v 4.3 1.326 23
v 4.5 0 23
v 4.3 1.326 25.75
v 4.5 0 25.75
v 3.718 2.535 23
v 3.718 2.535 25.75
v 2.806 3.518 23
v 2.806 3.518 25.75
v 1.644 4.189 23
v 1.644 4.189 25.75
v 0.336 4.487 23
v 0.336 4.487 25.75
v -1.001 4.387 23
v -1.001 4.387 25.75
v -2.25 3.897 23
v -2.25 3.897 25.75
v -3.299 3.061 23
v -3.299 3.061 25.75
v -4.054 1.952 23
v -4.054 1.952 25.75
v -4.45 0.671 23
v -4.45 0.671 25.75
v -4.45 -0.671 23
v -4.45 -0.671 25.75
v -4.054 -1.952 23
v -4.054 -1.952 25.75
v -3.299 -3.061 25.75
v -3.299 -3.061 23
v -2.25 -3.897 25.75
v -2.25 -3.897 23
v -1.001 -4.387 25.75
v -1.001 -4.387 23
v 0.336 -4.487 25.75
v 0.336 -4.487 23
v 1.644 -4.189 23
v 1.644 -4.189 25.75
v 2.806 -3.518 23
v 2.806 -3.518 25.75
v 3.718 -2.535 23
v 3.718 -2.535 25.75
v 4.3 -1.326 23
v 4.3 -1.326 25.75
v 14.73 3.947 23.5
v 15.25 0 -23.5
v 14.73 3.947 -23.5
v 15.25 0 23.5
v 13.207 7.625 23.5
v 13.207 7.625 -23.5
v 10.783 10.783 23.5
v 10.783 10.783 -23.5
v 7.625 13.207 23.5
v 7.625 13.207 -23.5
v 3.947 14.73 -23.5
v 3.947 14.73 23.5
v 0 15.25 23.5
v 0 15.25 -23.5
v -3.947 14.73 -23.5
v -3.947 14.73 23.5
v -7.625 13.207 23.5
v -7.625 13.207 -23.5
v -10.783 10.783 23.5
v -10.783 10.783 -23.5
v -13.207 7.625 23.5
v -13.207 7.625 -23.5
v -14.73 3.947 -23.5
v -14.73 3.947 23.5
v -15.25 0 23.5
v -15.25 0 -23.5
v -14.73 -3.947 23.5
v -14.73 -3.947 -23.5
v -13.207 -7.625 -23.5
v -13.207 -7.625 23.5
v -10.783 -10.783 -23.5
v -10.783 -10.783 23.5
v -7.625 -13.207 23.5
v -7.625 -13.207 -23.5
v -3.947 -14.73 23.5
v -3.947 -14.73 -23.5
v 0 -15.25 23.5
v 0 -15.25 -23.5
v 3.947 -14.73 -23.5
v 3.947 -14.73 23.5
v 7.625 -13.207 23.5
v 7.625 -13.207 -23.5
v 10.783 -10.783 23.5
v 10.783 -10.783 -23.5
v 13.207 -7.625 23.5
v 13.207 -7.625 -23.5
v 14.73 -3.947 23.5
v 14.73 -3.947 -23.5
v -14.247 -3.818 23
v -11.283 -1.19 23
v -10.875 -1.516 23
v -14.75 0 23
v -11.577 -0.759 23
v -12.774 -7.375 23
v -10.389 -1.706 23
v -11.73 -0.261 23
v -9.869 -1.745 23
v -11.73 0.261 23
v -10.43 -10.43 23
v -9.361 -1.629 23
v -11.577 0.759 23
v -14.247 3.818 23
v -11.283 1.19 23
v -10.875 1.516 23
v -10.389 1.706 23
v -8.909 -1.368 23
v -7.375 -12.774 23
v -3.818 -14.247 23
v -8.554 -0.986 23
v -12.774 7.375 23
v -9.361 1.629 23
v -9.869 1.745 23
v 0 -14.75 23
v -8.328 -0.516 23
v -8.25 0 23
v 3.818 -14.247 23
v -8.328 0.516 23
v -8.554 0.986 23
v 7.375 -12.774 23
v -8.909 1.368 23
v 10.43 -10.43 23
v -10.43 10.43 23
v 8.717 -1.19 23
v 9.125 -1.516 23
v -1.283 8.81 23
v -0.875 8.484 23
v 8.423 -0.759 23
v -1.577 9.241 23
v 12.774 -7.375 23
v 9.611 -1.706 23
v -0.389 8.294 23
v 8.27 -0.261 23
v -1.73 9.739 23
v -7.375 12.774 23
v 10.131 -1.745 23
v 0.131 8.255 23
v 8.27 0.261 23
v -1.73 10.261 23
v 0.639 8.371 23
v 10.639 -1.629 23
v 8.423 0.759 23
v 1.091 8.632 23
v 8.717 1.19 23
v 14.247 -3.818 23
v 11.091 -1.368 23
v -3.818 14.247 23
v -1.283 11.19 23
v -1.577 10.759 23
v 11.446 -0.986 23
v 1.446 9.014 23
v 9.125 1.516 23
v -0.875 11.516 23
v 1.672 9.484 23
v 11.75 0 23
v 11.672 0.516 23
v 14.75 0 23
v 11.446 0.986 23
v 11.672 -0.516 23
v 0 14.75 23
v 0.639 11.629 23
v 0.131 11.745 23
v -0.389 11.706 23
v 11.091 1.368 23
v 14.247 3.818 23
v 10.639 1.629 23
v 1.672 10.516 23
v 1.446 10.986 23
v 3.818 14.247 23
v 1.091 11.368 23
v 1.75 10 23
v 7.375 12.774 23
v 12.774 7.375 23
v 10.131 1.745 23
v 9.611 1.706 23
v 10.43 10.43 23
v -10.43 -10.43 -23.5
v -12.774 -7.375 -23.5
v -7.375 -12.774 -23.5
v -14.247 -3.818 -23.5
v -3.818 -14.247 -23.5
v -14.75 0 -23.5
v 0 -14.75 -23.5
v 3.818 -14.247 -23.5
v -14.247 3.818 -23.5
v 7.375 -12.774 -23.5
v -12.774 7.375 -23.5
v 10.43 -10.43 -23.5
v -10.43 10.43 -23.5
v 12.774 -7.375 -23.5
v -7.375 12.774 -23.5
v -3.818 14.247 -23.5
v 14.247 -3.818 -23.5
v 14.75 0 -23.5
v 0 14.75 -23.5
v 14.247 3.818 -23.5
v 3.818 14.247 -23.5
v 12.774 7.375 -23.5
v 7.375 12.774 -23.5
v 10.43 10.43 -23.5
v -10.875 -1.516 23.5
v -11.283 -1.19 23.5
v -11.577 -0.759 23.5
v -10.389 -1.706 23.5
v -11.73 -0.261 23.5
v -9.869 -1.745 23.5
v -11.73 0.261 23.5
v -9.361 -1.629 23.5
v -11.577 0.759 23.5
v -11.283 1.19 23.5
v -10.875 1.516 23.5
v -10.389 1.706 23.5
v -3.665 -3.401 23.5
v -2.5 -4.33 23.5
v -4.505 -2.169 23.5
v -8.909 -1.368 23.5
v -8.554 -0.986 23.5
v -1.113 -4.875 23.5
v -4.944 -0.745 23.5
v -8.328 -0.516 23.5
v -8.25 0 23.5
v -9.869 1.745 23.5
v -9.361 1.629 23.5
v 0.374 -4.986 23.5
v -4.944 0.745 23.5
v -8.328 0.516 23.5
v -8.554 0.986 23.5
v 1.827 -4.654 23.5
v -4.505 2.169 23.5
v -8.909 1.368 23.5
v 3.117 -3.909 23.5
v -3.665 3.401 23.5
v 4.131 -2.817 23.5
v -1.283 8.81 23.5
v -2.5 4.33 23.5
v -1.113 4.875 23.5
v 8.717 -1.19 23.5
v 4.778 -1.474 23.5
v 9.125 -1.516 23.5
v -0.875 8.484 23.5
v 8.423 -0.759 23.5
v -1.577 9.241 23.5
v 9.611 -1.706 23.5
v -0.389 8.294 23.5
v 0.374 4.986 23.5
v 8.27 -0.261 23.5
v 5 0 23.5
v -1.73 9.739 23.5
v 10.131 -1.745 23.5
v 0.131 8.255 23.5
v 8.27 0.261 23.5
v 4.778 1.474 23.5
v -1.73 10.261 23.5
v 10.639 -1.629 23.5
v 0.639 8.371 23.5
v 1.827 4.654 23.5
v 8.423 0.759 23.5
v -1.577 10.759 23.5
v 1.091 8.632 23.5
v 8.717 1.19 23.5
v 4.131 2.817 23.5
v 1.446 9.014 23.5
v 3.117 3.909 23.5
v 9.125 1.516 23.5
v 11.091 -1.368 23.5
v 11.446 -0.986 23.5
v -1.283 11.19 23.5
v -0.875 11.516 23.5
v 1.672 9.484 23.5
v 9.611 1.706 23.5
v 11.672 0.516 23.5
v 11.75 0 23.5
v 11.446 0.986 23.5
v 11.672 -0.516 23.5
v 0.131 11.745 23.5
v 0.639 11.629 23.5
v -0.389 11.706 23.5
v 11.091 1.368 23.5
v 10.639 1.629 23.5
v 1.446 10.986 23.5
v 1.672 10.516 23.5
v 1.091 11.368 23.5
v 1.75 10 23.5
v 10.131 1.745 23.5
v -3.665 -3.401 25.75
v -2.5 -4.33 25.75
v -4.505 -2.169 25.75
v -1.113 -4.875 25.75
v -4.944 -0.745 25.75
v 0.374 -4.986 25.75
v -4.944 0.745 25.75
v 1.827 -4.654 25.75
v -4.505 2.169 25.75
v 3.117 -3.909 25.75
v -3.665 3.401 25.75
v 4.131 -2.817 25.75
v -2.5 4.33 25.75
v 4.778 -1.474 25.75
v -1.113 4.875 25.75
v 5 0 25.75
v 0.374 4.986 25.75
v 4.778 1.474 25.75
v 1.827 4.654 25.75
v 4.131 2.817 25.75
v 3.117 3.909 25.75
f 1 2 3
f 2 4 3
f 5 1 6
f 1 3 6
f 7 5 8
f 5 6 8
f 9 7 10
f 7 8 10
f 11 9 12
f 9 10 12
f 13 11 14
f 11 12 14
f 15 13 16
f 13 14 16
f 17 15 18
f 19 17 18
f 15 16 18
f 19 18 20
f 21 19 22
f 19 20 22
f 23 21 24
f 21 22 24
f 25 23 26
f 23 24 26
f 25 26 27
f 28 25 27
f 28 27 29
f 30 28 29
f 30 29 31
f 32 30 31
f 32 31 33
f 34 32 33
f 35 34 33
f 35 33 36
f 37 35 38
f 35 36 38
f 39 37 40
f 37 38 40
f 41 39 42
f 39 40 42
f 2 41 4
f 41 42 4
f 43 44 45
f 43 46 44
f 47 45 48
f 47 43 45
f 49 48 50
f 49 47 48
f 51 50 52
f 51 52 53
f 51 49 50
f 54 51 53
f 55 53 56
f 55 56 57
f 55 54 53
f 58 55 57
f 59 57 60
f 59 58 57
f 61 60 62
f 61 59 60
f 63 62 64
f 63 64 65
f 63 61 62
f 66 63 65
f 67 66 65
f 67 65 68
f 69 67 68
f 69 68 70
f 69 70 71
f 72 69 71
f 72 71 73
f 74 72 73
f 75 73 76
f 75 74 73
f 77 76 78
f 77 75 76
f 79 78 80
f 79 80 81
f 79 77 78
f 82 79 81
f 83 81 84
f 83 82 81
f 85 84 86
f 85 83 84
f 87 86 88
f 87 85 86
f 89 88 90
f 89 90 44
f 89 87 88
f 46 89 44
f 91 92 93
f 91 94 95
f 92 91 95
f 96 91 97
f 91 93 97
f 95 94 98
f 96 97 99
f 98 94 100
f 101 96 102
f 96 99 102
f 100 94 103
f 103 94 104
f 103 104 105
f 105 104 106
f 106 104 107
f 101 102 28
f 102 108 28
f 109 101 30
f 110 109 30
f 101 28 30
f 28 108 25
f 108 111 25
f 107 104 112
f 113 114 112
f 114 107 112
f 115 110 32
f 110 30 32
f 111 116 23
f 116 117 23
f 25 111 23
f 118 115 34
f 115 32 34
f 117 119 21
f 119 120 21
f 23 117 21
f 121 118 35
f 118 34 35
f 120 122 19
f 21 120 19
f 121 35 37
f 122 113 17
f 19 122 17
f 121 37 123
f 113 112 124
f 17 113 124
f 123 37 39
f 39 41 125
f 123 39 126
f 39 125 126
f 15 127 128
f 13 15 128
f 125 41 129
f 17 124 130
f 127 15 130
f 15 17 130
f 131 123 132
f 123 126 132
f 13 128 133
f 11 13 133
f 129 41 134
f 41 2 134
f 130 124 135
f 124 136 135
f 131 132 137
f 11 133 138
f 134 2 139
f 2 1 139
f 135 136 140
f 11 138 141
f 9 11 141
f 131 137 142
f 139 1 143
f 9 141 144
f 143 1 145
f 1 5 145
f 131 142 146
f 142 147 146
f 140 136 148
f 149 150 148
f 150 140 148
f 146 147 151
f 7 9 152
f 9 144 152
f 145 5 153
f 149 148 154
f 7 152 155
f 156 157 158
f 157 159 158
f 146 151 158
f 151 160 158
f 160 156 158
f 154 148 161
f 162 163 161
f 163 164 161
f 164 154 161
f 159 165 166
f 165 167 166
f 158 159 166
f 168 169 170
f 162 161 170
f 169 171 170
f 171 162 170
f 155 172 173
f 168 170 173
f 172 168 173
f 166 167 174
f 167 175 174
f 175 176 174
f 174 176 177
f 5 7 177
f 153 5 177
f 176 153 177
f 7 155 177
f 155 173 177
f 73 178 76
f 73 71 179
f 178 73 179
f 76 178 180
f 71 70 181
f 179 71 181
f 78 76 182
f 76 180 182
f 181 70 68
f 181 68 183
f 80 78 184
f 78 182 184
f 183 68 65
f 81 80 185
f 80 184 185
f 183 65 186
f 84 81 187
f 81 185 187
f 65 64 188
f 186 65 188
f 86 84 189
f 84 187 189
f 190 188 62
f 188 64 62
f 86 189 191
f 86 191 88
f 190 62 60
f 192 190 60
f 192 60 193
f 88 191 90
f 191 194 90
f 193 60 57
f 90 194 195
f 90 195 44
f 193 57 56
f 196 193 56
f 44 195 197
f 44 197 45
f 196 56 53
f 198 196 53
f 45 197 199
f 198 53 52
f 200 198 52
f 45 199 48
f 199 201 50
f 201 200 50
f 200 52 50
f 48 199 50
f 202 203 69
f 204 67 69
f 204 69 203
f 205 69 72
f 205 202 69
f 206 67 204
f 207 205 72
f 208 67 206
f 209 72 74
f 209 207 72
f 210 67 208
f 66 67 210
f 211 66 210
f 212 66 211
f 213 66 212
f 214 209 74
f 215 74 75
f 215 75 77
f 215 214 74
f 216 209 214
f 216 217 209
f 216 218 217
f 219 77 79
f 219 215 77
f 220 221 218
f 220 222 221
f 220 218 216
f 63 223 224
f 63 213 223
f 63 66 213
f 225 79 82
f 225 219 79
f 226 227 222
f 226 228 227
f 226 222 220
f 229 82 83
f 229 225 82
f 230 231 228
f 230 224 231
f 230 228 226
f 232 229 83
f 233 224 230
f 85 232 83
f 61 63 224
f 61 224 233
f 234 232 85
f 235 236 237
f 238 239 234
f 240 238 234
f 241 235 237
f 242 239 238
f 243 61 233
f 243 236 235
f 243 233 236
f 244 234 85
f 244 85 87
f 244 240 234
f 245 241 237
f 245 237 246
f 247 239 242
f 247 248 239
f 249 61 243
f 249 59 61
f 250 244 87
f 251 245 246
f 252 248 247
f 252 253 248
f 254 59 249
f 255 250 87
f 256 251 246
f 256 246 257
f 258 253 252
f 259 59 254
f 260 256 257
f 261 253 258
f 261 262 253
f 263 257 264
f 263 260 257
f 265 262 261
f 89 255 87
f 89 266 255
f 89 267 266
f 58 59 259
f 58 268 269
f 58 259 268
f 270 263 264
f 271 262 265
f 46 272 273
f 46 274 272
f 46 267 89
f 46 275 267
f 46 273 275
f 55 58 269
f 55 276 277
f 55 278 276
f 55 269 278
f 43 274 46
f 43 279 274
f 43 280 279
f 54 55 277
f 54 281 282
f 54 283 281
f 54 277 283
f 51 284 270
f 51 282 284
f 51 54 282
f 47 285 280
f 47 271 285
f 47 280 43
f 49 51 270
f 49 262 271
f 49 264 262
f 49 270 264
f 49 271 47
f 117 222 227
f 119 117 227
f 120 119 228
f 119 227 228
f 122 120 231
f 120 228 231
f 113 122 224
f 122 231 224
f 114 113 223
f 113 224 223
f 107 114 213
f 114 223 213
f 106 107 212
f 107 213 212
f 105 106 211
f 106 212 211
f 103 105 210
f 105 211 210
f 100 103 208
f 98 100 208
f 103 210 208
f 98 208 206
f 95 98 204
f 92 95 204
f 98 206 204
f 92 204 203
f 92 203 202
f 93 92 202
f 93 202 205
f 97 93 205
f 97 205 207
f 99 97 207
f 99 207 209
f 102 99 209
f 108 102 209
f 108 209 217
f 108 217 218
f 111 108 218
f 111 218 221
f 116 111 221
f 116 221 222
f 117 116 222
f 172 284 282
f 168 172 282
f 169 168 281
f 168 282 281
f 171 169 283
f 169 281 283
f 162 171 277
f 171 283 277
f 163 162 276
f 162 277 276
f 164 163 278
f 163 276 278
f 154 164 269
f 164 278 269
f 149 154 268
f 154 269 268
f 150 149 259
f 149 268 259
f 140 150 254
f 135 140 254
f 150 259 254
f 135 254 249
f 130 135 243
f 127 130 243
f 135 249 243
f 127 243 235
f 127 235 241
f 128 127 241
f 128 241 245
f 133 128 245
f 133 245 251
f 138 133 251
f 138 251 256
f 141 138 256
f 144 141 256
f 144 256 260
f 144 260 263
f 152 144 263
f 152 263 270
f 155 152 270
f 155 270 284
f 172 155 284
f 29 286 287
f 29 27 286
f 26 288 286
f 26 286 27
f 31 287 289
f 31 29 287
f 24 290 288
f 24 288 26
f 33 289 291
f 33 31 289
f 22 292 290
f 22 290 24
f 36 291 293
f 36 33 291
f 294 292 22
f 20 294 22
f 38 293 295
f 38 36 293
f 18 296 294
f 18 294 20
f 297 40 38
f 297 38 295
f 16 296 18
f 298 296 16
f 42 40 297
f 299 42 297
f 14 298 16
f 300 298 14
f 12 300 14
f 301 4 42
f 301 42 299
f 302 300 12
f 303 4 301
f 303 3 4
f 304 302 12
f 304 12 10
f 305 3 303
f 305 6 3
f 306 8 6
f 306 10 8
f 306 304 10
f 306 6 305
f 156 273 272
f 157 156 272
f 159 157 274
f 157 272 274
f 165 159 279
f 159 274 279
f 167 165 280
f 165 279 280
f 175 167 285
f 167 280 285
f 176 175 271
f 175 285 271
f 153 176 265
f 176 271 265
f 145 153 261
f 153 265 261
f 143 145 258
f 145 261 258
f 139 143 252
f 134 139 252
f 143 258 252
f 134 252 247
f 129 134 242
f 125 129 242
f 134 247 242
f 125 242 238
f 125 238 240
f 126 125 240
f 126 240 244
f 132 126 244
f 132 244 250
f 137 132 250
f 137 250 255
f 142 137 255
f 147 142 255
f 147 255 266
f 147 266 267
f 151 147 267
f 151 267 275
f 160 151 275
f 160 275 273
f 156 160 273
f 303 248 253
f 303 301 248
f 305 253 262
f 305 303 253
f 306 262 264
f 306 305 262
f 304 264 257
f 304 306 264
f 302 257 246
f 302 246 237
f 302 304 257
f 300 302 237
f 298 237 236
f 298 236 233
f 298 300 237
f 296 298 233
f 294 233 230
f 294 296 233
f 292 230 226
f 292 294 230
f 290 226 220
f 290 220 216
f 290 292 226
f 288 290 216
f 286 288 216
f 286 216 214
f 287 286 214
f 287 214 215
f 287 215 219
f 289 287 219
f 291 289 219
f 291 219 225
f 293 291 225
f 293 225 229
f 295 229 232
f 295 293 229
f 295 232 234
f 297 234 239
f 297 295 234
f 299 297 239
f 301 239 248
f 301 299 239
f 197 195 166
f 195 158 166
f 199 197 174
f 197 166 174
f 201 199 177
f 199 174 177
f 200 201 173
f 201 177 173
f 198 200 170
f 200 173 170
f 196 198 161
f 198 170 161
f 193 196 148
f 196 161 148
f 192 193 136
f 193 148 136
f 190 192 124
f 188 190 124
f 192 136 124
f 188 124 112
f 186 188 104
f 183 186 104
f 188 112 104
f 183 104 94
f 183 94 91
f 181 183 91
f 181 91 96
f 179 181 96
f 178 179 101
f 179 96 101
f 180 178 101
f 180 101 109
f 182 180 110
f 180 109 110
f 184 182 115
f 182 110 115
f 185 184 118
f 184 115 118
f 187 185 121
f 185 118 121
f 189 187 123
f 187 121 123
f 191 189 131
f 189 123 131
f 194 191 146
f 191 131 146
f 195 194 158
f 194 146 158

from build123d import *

# Parameters (mm, degrees)
SKETCH1_R           = 15.25
BOSS_EXTRUDE1_DEPTH = 23.5
SKETCH2_R           = 5
BOSS_EXTRUDE2_DEPTH = 2.25
SHELL1_T            = -0.5
SKETCH3_R           = 1.75
CUT_EXTRUDE1_DEPTH  = 4.5


with BuildPart() as part:
    # Sketch1 → Boss-Extrude1 (new, symmetric)
    with BuildSketch(Plane.XY):
        Circle(SKETCH1_R)
    extrude(amount=BOSS_EXTRUDE1_DEPTH, both=True)

    # Sketch2 → Boss-Extrude2 (add, symmetric)
    with BuildSketch(Plane.XY.offset(23.5)):
        Circle(SKETCH2_R)
    extrude(amount=BOSS_EXTRUDE2_DEPTH, both=True)

    # Shell1
    shell1_openings = [part.faces().sort_by_distance(p)[0] for p in [
        (0, 0, -23.5),
        (0, 0, 25.75),
    ]]
    offset(amount=SHELL1_T, openings=shell1_openings, kind=Kind.INTERSECTION)

    # Sketch3 → Cut-Extrude1 (cut)
    with BuildSketch(Plane.XY.offset(23.5)):
        with Locations((-10, 0)):
            Circle(SKETCH3_R)
        with Locations((0, 10)):
            Circle(SKETCH3_R)
        with Locations((10, 0)):
            Circle(SKETCH3_R)
    extrude(amount=-CUT_EXTRUDE1_DEPTH, mode=Mode.SUBTRACT)


solid = part.part
